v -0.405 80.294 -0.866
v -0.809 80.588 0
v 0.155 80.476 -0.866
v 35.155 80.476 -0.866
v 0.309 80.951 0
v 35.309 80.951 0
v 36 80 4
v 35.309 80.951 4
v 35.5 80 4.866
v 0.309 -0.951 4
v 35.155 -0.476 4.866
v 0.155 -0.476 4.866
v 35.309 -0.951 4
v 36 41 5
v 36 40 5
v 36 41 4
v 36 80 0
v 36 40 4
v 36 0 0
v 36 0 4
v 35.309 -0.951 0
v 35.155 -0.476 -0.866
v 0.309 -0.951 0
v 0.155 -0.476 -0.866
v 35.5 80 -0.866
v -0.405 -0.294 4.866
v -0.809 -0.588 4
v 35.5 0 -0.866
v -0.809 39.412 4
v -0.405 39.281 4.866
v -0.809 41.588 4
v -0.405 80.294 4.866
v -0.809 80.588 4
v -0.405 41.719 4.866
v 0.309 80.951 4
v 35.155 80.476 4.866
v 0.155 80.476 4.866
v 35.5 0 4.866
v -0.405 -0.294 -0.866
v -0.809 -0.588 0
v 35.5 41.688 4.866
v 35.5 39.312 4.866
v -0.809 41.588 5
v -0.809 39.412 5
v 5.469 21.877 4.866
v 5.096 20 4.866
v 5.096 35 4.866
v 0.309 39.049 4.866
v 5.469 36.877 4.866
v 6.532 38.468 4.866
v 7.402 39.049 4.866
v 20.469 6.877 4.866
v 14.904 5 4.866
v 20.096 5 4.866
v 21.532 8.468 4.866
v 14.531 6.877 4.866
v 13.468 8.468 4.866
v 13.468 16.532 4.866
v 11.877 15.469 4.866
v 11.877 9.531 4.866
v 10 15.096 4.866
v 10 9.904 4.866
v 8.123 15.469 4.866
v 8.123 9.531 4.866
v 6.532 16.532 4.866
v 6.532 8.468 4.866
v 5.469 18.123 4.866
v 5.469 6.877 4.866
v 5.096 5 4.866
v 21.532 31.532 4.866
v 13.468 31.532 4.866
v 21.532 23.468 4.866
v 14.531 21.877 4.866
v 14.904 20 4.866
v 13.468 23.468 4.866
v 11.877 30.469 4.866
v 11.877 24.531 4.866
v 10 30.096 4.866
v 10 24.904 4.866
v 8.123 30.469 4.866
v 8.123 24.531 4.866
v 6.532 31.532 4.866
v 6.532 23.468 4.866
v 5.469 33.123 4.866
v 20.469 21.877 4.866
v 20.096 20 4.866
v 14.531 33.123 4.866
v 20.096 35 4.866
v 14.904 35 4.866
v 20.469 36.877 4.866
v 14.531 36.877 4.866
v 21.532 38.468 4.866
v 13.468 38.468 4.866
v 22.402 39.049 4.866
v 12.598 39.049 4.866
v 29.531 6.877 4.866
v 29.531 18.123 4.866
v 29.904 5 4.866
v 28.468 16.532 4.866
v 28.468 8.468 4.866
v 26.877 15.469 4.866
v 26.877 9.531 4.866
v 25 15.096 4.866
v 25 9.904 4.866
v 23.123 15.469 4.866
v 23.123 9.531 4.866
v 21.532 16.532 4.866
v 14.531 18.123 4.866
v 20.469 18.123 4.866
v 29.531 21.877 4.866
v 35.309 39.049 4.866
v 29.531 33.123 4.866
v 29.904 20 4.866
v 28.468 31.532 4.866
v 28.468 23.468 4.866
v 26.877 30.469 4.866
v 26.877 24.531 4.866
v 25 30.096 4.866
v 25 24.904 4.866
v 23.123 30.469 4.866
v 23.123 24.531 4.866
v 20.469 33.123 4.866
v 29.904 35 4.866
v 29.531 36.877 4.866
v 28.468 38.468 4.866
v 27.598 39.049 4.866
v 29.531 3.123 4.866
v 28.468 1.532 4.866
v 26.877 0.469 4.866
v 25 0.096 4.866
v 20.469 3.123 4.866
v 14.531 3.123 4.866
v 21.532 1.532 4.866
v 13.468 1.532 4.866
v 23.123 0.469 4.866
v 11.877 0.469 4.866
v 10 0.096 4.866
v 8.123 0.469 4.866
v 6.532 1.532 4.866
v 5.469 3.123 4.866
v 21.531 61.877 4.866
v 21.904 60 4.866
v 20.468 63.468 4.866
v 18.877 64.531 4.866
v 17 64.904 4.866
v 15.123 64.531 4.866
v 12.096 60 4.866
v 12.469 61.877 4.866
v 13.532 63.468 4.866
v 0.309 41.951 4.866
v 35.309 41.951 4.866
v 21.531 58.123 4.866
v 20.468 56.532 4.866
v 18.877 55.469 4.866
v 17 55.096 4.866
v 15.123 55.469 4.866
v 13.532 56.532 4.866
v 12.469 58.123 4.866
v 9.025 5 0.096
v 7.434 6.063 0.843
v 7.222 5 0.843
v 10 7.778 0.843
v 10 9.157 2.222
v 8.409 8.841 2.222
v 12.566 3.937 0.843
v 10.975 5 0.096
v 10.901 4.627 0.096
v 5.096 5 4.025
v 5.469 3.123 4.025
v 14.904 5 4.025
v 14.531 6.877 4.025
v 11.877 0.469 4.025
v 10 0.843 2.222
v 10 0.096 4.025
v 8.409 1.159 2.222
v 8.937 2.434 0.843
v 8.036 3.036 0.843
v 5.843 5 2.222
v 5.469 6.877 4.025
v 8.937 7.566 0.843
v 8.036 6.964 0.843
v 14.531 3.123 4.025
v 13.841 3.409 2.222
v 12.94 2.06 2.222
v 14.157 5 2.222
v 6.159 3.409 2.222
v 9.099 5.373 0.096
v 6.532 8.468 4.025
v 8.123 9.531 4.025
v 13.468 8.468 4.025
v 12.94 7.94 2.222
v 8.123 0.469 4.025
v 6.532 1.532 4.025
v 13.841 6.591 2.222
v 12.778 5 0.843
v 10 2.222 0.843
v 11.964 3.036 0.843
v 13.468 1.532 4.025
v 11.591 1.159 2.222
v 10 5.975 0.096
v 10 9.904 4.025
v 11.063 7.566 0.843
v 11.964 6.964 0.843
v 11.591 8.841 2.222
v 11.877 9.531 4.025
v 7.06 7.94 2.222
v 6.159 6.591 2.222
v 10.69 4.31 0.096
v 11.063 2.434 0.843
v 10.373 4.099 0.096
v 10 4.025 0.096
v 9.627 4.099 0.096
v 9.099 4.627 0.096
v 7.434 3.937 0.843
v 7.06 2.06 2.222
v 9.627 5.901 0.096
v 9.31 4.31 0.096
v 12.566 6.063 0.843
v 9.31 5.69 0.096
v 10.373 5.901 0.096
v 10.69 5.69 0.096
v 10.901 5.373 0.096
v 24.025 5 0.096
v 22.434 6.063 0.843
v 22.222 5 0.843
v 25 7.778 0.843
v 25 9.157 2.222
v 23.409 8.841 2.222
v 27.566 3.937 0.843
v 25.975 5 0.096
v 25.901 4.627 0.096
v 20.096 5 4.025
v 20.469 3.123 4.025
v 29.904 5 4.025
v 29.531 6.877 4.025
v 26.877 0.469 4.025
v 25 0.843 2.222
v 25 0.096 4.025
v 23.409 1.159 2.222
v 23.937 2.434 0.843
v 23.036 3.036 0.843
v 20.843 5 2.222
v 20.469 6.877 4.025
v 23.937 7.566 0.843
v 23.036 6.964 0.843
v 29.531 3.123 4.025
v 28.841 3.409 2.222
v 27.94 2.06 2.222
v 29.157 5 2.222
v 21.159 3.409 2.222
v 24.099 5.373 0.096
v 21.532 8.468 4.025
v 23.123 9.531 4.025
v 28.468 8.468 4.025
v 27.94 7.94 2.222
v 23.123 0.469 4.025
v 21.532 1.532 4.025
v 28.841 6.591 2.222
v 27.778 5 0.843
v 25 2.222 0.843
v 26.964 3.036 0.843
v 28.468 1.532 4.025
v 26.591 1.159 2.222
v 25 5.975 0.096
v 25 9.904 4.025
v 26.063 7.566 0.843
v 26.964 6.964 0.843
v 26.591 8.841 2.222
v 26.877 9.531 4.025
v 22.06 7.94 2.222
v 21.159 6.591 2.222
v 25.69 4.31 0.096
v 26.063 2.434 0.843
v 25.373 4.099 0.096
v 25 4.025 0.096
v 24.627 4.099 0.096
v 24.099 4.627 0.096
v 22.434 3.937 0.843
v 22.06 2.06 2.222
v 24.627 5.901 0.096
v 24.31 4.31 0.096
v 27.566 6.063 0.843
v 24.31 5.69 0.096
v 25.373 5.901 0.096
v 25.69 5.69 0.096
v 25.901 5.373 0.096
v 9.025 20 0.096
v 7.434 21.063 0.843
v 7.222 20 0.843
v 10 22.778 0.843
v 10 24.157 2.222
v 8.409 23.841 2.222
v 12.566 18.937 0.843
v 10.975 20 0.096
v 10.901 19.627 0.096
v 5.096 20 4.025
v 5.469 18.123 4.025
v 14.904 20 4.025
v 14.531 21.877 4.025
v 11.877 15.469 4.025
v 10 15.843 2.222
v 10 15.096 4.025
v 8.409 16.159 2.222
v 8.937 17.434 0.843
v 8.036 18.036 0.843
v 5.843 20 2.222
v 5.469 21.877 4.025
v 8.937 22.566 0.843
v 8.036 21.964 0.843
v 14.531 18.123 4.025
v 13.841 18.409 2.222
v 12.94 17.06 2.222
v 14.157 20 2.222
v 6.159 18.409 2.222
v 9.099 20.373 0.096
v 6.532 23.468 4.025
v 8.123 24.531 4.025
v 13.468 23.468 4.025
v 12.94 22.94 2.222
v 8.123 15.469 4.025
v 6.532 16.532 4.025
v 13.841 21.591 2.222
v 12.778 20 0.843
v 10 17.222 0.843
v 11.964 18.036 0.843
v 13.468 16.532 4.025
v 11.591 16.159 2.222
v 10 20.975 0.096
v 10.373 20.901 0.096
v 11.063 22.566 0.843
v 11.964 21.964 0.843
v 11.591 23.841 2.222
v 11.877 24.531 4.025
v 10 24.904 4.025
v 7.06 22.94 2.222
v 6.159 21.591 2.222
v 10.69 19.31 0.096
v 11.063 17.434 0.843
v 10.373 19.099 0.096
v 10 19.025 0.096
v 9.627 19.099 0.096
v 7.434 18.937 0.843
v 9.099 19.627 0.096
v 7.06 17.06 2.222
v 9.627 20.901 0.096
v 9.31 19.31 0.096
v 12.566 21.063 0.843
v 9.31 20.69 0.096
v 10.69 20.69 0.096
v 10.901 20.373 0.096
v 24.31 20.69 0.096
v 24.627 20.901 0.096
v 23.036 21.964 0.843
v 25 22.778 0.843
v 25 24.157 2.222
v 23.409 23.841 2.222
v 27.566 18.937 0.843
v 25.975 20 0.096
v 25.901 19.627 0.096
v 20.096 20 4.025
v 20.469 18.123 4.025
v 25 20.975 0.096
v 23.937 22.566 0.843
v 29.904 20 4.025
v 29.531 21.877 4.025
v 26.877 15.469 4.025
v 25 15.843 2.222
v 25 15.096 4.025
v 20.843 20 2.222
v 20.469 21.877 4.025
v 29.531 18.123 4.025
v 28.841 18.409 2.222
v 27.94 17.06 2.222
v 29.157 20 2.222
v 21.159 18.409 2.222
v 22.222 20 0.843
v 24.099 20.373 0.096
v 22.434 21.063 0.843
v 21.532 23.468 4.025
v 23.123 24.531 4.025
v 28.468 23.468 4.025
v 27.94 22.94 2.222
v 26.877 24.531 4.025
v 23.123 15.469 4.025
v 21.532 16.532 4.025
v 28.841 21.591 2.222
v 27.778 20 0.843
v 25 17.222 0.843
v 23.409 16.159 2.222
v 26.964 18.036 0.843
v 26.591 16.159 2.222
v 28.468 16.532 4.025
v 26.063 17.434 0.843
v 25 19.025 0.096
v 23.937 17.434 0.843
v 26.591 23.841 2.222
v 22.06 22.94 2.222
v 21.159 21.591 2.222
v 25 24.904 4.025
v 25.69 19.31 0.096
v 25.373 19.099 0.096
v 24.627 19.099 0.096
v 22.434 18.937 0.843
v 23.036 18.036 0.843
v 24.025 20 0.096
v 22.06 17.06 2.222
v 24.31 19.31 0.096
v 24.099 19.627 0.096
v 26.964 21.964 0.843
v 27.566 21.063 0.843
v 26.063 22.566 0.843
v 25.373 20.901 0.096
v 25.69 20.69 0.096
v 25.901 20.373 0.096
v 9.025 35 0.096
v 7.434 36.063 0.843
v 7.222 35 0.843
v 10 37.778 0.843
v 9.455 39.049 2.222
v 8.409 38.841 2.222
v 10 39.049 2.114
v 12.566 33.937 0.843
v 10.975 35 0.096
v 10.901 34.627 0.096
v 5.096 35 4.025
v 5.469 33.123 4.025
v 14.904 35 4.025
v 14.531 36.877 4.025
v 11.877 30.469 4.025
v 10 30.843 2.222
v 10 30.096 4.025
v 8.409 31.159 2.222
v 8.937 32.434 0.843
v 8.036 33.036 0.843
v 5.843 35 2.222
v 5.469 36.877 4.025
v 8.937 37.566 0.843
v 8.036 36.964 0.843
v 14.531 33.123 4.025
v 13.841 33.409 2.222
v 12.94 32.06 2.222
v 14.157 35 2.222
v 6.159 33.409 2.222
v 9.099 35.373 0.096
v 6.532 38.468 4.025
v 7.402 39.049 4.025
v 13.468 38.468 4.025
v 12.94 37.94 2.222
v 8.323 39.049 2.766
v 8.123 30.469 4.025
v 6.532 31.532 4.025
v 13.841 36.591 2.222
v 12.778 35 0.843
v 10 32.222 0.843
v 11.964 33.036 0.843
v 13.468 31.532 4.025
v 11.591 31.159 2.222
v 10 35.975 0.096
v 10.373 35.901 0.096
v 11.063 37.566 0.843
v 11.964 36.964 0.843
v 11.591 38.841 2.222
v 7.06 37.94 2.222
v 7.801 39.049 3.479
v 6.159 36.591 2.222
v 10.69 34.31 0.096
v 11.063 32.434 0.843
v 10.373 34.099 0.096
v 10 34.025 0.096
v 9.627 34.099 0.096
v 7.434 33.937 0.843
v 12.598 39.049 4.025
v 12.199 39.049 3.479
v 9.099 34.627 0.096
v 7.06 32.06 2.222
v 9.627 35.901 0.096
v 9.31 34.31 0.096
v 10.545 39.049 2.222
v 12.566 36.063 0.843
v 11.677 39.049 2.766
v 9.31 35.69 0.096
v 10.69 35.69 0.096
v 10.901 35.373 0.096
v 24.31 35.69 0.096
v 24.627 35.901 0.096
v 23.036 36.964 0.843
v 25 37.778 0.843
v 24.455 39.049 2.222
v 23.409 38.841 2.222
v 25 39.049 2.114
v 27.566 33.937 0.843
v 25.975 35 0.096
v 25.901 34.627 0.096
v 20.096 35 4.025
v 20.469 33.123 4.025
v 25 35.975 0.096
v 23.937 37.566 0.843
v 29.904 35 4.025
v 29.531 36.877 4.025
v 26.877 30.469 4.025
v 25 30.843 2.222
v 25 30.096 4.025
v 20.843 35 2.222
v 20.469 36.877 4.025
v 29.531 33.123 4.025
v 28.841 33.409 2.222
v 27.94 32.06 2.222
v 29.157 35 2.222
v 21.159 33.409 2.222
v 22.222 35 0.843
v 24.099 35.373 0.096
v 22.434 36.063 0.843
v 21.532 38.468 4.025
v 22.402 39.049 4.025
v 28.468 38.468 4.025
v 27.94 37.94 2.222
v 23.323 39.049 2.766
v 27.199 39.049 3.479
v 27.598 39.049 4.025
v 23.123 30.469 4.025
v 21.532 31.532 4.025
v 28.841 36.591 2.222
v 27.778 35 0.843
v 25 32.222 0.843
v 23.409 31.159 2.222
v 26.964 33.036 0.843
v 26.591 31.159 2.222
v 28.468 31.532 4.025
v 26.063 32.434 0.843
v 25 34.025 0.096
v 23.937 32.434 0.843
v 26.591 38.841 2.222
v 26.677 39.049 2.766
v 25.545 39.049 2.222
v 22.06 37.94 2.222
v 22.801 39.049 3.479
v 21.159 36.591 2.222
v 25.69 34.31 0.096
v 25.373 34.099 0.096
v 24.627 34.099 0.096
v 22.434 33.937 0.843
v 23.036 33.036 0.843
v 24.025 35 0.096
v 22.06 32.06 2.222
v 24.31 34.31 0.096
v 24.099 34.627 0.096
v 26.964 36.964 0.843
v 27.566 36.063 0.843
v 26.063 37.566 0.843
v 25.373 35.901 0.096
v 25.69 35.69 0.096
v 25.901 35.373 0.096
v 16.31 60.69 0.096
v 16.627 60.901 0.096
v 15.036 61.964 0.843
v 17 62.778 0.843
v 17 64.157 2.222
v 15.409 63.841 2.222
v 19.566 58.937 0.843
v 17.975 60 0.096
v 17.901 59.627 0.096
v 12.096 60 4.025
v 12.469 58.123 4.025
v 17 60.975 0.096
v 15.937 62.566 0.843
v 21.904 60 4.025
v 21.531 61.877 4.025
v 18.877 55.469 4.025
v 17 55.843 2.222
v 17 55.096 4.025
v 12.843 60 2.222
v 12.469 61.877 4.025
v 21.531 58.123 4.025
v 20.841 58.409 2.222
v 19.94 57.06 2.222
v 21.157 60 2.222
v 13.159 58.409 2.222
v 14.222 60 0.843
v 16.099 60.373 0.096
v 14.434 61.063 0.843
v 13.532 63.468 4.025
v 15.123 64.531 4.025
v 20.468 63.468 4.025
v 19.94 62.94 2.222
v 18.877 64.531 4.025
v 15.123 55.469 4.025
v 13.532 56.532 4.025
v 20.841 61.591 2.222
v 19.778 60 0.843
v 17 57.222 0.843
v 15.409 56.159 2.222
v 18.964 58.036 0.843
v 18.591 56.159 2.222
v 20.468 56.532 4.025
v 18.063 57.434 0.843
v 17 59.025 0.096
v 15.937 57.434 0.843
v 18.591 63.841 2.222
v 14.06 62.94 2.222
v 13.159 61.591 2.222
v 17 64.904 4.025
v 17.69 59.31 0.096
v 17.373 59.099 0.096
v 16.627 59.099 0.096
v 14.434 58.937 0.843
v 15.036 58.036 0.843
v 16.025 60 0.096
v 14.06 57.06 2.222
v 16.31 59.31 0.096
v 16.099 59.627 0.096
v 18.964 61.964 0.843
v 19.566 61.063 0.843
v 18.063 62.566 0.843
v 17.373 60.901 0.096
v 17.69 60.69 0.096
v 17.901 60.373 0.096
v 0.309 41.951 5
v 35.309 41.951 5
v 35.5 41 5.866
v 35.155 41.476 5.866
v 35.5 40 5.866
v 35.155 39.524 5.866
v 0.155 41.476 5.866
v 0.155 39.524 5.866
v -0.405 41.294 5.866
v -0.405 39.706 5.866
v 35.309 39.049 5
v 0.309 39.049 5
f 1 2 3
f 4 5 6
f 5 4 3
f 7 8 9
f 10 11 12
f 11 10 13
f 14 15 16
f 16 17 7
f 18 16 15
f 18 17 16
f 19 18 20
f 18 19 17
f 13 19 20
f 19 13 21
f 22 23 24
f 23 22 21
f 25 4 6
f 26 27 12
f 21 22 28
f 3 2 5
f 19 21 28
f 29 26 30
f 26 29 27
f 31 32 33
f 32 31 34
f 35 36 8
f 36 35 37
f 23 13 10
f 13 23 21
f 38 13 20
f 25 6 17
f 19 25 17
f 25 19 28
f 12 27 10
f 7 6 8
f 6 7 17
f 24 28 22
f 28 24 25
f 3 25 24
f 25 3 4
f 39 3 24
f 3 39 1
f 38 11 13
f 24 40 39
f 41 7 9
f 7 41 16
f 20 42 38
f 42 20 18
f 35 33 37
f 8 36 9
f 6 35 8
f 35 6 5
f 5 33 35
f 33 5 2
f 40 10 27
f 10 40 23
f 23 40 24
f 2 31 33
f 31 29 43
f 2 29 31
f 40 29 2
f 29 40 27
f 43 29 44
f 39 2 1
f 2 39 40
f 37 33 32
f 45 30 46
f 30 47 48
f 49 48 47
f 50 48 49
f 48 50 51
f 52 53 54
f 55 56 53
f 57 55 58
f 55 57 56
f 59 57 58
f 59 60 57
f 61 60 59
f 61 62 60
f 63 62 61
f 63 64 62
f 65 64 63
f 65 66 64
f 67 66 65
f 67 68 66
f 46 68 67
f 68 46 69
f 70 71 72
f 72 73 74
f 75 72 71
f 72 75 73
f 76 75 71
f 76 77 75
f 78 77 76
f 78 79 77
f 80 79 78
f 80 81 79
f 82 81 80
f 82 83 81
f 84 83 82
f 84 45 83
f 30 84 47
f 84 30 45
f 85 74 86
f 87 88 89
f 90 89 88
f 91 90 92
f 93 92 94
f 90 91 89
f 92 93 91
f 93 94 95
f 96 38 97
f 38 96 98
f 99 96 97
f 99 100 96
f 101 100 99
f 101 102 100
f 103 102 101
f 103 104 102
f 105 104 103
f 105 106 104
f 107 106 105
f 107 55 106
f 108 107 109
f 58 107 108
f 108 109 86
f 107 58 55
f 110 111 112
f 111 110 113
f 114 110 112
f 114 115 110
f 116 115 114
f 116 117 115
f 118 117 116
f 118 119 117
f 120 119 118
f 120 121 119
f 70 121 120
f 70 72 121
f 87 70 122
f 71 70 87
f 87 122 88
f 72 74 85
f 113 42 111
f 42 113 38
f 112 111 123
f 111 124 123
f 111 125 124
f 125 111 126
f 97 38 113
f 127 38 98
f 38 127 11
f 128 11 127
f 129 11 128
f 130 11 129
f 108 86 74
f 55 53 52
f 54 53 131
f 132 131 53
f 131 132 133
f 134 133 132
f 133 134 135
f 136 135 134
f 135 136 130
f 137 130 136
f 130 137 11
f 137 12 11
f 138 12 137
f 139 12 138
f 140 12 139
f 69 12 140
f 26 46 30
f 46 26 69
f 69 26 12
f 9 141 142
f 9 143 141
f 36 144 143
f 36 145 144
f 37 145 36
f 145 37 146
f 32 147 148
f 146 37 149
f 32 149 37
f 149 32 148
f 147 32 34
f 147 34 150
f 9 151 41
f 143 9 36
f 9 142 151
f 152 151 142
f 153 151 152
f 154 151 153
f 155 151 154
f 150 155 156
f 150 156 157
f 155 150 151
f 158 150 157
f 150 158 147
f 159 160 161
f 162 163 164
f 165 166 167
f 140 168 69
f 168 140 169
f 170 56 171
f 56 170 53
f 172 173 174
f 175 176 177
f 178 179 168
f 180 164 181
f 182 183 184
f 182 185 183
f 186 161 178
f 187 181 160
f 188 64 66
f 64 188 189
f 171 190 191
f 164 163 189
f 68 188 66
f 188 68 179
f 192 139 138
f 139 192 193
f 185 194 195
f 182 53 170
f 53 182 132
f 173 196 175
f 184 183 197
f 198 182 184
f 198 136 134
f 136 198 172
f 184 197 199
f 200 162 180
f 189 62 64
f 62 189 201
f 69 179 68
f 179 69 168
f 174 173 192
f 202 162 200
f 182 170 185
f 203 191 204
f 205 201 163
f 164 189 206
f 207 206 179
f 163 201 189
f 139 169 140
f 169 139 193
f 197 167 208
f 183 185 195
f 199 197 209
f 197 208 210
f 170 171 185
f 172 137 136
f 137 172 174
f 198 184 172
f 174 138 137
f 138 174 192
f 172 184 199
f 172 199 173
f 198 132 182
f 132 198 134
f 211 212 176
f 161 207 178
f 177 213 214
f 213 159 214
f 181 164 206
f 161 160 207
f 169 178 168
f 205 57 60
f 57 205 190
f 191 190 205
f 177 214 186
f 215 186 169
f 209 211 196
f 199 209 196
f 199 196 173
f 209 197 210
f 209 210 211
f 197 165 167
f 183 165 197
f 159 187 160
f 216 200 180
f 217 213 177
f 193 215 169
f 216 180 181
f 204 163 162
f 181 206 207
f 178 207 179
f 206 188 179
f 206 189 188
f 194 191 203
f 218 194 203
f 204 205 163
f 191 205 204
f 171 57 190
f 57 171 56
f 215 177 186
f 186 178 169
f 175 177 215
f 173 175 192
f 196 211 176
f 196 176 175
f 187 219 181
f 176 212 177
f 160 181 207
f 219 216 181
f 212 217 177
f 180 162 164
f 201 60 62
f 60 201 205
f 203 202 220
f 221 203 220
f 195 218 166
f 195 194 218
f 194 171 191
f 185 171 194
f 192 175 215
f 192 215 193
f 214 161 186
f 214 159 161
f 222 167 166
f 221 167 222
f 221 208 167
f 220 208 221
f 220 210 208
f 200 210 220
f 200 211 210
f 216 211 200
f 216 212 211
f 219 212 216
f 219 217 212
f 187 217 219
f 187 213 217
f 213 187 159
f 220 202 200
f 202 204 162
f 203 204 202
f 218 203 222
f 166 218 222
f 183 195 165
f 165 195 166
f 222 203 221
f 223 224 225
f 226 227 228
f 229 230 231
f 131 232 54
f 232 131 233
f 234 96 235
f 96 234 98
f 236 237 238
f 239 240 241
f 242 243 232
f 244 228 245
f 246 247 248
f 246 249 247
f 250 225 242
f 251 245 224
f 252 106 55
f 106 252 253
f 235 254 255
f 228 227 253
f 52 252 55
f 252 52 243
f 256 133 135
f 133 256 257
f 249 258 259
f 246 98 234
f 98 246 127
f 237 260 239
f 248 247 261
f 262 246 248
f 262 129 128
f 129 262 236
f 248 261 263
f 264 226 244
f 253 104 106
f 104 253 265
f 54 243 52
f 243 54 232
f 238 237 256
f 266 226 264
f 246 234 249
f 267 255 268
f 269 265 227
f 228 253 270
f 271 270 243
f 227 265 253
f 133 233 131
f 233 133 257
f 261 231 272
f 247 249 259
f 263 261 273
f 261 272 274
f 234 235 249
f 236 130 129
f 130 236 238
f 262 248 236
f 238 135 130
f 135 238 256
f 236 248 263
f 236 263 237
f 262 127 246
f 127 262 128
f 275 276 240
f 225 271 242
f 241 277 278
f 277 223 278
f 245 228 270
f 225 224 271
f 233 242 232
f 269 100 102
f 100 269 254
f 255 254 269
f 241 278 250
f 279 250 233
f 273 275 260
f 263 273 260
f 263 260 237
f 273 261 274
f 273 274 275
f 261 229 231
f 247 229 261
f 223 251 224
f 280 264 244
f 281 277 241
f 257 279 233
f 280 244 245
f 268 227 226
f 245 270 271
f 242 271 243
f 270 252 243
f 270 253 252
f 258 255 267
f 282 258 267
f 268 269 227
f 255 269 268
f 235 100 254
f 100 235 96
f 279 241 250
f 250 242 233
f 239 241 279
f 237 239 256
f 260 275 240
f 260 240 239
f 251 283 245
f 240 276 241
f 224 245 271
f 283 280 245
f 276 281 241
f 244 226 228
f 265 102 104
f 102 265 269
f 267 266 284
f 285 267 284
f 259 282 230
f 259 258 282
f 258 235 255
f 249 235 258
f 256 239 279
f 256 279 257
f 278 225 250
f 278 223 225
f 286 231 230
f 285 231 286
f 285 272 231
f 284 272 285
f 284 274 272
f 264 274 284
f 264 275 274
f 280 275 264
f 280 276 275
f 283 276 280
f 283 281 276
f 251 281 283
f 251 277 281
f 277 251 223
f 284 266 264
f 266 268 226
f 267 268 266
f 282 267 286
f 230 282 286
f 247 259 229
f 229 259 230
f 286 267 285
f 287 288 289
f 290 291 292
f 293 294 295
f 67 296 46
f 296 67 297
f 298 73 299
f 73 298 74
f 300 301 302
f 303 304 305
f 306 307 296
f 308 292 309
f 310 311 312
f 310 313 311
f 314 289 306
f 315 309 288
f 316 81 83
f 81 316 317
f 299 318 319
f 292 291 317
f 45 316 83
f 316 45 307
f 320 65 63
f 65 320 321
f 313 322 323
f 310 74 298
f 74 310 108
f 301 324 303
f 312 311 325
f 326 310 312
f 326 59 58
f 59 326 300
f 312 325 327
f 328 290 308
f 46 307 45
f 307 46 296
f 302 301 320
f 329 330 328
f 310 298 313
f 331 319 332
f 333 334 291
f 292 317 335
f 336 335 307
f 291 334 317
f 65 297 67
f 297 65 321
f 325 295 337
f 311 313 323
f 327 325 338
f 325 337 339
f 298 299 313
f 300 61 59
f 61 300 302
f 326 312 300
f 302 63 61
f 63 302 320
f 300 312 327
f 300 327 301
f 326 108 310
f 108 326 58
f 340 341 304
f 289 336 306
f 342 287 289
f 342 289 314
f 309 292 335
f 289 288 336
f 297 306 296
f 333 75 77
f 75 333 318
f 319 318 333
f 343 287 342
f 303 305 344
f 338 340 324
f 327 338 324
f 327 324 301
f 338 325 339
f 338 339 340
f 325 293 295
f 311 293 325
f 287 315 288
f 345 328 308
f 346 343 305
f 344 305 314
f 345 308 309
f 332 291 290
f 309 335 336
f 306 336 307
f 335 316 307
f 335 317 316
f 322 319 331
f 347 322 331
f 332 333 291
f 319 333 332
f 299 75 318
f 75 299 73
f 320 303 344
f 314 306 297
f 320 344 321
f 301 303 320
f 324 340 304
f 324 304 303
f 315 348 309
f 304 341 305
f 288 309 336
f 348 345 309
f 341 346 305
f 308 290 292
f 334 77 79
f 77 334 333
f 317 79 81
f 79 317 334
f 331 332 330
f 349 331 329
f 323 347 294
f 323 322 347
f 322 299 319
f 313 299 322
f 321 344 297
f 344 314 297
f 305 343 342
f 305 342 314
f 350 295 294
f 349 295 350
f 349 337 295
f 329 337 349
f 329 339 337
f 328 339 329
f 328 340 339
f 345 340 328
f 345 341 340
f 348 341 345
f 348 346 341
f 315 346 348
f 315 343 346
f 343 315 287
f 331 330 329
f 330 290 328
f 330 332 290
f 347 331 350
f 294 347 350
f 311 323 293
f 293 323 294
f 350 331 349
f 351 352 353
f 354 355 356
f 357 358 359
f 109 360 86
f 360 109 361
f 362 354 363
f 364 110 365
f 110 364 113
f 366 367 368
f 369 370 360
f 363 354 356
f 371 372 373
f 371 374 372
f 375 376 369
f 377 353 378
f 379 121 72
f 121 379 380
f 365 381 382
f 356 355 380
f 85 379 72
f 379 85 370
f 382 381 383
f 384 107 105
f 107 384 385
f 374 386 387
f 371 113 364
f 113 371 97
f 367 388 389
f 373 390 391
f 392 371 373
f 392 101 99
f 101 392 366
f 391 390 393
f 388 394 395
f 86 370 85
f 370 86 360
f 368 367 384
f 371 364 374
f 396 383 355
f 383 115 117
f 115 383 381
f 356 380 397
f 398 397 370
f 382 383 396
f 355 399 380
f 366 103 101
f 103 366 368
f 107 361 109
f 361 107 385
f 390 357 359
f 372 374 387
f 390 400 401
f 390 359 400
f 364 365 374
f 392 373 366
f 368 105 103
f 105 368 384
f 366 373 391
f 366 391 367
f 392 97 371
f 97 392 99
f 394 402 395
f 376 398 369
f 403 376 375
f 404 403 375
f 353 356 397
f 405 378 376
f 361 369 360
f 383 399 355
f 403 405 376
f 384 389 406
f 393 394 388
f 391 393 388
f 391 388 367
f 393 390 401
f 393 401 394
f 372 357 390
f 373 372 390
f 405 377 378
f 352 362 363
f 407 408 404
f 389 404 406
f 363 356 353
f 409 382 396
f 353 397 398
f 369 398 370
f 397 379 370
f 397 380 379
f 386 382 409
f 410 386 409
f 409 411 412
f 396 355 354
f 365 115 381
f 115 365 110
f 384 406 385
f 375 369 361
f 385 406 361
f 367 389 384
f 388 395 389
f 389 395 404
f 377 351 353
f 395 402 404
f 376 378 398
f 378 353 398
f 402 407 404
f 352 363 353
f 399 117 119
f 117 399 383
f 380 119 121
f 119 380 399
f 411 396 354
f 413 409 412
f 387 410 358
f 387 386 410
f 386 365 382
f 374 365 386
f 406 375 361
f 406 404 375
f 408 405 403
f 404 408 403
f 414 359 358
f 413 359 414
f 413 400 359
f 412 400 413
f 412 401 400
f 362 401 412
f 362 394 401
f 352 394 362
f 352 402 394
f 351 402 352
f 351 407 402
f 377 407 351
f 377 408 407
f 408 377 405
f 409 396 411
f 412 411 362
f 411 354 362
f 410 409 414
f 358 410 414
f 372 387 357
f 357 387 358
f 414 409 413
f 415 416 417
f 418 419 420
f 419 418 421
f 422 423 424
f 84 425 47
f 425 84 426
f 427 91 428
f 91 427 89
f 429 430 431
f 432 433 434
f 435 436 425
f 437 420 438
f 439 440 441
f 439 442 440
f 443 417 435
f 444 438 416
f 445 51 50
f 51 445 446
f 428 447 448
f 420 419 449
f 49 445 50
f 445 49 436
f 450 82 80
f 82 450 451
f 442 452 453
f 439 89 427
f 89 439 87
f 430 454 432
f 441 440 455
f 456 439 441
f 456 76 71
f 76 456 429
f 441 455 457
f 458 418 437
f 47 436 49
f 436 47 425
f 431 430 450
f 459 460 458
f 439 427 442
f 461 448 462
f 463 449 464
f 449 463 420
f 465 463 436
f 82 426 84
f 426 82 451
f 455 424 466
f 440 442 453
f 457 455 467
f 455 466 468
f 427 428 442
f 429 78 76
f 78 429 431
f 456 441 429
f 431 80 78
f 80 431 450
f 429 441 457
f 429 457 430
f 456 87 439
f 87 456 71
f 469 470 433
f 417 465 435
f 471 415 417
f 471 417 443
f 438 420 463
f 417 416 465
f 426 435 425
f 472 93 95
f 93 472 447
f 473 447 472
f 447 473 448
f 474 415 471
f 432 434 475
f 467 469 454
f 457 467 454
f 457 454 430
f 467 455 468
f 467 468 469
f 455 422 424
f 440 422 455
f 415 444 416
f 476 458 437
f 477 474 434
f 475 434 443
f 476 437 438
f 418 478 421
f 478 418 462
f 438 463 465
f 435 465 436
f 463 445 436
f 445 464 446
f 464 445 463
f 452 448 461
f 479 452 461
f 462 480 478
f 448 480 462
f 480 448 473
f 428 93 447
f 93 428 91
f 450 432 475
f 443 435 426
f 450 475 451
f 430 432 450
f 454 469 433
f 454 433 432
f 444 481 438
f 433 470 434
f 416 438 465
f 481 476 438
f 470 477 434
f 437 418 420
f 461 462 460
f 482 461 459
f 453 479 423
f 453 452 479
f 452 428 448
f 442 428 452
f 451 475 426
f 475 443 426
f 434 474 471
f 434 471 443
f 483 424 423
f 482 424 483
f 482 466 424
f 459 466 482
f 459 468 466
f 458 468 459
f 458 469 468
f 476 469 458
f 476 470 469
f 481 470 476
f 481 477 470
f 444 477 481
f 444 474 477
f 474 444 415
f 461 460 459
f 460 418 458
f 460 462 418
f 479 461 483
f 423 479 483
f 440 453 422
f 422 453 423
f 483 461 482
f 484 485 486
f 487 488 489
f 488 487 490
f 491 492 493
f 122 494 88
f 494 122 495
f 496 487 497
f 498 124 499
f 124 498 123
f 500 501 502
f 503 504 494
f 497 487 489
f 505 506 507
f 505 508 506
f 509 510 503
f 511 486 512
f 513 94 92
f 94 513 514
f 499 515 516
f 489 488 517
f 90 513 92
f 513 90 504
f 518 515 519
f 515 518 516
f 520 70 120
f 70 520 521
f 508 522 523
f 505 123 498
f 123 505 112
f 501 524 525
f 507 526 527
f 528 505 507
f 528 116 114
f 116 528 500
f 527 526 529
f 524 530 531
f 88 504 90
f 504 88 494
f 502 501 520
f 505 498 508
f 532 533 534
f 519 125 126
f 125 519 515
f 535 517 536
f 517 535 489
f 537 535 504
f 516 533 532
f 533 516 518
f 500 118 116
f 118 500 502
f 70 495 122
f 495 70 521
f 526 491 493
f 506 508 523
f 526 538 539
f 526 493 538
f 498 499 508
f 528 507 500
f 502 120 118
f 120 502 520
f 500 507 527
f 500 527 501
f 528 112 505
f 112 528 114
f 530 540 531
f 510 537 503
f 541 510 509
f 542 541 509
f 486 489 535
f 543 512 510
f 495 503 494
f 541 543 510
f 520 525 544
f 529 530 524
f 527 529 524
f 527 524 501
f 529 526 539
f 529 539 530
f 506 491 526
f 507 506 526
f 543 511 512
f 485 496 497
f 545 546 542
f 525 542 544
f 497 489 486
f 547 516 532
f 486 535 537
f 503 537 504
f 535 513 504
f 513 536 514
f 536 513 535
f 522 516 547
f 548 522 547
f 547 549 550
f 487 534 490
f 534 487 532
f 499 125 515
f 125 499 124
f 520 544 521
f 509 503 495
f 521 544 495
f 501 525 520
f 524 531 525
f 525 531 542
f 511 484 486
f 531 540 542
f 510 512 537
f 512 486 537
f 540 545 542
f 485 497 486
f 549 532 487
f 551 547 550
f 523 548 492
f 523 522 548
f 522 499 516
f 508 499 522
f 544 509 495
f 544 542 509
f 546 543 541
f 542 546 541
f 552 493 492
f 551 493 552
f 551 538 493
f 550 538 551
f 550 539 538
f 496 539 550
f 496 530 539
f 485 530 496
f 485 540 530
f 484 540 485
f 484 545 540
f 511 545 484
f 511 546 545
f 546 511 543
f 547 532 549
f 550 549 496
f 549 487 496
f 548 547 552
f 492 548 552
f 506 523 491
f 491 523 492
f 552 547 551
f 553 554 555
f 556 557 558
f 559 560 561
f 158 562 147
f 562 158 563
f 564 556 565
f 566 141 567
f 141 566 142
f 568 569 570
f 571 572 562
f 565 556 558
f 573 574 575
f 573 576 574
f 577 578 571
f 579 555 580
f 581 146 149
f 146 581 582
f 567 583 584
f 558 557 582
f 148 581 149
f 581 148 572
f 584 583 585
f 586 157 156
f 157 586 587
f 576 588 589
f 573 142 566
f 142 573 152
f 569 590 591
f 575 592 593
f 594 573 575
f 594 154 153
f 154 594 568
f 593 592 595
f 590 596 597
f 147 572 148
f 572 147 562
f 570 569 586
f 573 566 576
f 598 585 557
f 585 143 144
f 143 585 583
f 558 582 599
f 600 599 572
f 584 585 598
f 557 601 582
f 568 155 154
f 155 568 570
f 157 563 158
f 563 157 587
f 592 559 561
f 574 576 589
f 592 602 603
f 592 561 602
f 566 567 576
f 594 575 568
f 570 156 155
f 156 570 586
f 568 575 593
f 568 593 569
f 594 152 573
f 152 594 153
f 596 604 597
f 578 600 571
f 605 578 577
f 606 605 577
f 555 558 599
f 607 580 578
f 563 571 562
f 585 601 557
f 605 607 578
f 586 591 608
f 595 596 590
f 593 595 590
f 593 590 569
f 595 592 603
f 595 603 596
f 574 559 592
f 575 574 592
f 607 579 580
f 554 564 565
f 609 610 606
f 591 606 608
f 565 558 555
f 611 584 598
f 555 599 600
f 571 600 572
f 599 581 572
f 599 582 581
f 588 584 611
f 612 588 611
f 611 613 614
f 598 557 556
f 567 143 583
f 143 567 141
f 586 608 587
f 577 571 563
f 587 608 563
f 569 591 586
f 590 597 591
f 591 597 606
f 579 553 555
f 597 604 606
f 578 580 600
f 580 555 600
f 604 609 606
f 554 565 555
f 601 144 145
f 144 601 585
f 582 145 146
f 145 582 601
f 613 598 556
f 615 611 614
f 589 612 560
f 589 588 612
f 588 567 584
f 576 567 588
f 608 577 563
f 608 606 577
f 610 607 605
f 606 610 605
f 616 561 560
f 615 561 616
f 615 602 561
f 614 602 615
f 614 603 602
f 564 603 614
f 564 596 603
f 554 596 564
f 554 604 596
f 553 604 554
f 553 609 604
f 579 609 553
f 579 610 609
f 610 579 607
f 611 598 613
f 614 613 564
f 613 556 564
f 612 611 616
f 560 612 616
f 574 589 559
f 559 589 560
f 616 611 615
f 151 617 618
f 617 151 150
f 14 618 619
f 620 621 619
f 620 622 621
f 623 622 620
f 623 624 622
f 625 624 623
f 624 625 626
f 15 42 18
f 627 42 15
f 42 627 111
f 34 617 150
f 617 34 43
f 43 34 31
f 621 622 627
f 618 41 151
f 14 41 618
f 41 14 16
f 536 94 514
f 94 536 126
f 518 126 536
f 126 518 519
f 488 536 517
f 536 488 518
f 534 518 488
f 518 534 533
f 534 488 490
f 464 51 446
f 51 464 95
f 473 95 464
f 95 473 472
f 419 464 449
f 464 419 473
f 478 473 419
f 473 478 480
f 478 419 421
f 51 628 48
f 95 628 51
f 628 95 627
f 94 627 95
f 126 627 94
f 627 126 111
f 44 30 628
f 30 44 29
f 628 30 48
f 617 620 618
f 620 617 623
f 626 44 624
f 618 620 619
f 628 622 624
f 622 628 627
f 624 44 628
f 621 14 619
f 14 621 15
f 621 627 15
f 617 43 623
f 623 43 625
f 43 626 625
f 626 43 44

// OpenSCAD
// Loguncov Maxim 13.12.13


//$fn=128;


translate([0,40,0])
minkowski()
{cube([35,1,5]);
sphere(1);
}

difference() {

//основа
minkowski()
{cube([35,80,4]);
sphere(1);
}

//отверстия
translate([10,5,5])sphere(5);
translate([25,5,5])sphere(5);
translate([10,20,5])sphere(5);
translate([25,20,5])sphere(5);
translate([10,35,5])sphere(5);
translate([25,35,5])sphere(5);

translate([17,60,5])sphere(5);



}
